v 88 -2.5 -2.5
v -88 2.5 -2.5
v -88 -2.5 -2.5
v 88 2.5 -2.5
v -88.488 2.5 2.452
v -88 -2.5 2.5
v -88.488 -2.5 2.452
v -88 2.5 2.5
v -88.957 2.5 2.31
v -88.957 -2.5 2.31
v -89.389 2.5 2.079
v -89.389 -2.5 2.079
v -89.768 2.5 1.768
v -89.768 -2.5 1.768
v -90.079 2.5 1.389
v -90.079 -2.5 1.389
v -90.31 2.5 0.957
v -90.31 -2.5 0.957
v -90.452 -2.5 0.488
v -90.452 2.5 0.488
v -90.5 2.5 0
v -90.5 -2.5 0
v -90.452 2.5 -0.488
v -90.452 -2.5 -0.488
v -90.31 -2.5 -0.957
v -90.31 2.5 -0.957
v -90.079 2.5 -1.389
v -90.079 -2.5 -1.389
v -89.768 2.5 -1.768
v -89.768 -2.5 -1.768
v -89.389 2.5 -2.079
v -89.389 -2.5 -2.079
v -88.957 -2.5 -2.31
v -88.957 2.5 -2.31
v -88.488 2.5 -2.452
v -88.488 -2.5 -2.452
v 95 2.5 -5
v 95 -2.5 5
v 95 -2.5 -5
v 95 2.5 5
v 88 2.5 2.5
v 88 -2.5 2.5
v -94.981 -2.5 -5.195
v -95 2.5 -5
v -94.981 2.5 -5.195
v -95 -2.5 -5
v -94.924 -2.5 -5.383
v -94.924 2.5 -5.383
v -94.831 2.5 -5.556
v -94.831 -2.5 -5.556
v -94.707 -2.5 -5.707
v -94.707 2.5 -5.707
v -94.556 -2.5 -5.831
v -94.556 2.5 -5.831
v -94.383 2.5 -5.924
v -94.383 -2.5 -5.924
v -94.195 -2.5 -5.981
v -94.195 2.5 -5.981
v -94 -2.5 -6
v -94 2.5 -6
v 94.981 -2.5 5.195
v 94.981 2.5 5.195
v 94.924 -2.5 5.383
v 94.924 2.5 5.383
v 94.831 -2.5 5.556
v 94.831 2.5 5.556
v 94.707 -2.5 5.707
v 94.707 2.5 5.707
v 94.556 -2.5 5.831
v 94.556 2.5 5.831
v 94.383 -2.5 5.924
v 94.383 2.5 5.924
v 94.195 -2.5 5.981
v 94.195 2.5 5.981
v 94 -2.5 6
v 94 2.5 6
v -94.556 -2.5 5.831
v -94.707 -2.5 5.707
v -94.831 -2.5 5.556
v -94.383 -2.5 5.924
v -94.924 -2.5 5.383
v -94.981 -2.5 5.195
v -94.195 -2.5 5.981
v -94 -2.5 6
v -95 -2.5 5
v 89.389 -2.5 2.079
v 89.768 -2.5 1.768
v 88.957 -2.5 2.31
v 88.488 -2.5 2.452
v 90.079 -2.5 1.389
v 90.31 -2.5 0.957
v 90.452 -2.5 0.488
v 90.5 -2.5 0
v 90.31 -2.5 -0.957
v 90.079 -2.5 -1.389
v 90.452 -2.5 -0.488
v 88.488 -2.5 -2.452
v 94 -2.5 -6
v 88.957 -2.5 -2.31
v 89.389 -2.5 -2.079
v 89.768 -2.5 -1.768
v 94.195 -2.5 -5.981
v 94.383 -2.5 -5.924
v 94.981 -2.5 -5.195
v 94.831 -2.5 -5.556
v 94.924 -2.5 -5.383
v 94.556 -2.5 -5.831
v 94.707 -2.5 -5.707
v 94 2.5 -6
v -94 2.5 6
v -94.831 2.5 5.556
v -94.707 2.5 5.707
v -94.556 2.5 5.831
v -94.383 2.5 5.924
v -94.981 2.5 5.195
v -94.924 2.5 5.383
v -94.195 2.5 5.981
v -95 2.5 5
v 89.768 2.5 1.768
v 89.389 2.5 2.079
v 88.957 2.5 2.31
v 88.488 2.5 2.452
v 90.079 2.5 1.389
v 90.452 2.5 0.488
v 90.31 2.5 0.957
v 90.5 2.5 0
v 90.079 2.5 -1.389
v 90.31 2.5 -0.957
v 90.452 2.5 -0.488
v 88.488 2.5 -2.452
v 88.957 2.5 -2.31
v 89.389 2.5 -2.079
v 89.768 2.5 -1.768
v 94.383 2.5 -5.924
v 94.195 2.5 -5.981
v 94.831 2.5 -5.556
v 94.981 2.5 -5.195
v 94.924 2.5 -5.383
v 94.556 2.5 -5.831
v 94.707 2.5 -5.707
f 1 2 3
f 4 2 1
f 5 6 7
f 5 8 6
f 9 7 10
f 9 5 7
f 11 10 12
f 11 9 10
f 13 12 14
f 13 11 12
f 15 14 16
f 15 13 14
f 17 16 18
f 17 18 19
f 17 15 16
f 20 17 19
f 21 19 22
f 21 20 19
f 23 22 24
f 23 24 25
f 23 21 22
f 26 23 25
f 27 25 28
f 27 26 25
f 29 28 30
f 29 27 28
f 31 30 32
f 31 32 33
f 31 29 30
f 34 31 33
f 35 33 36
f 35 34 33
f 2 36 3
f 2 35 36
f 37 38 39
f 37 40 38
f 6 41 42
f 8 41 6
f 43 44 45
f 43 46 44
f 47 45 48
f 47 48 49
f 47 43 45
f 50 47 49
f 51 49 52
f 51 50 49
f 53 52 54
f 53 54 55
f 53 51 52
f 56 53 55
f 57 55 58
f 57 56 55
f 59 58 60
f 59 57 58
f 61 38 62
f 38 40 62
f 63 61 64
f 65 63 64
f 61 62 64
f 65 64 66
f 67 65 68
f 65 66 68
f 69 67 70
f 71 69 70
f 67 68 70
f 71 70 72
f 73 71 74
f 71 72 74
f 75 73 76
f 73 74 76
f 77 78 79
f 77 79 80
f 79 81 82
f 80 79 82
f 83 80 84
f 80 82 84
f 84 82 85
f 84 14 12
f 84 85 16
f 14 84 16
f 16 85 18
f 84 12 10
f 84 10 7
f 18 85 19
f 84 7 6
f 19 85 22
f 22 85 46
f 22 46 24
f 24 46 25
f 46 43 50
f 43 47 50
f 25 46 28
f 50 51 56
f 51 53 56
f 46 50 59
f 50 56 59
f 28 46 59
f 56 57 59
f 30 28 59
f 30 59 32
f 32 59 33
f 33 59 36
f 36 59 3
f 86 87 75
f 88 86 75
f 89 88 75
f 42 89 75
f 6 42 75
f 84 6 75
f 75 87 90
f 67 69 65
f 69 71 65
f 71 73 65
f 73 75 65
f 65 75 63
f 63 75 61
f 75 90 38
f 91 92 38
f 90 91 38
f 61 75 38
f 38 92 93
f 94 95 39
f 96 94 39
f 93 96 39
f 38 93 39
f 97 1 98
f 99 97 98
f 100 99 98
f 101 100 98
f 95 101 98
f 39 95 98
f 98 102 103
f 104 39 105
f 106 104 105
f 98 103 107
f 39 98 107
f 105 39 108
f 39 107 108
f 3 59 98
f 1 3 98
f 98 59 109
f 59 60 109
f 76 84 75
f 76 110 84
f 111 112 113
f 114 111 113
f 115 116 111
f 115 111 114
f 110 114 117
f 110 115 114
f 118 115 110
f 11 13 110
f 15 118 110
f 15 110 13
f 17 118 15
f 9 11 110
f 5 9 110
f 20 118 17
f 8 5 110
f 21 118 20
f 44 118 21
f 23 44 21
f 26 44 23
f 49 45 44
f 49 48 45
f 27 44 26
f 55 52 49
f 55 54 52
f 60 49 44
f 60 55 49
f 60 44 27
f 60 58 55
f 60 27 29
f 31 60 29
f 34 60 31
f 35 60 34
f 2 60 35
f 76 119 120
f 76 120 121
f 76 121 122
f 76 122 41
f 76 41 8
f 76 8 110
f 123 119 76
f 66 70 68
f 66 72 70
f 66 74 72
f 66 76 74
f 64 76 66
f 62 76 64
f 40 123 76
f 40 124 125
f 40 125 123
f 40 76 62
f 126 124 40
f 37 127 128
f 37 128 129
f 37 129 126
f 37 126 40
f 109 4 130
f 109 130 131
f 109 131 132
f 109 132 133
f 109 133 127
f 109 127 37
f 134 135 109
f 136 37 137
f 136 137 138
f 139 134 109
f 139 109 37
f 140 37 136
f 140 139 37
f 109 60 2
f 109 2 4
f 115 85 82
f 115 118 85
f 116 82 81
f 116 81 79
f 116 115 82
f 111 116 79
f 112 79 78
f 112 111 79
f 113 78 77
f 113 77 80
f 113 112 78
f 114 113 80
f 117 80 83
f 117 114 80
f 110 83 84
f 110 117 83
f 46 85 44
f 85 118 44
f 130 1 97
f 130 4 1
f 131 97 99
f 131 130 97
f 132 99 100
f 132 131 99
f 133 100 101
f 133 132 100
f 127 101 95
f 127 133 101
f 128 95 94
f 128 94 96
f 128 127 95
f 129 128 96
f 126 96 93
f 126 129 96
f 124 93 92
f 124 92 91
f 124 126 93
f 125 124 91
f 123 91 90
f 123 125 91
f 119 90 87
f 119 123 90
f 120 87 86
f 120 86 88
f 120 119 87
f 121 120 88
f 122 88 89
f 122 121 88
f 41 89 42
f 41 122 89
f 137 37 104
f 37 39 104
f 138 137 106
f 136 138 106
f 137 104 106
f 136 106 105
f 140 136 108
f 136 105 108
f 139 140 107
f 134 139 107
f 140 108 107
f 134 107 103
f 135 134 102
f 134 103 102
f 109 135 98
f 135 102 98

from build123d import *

# Parameters (mm, degrees)
ESQUISSE1_W        = 190
ESQUISSE1_H        = 12
BOSS_EXTRU_1_DEPTH = 2.5
CONG_2_R           = 1


with BuildPart() as part:
    # Esquisse1 → Boss.-Extru.1 (new body, symmetric)
    with BuildSketch(Plane(origin=(0, 0, 0), x_dir=(1, 0, 0), z_dir=(0, 1, 0))):
        Rectangle(ESQUISSE1_W, ESQUISSE1_H)
        with BuildLine():
            Line((-88, 2.5), (88, 2.5))
            ThreePointArc((88, 2.5), (90.5, 0), (88, -2.5))
            Line((88, -2.5), (-88, -2.5))
            ThreePointArc((-88, -2.5), (-90.5, 0), (-88, 2.5))
        make_face(mode=Mode.SUBTRACT)
    extrude(amount=BOSS_EXTRU_1_DEPTH, both=True)

    # Congé2
    cong_2_edges = [part.edges().sort_by_distance(p)[0] for p in [
        (95, 0, 6),
        (-95, 0, 6),
        (-95, 0, -6),
        (95, 0, -6),
    ]]
    fillet(cong_2_edges, radius=CONG_2_R)


solid = part.part
